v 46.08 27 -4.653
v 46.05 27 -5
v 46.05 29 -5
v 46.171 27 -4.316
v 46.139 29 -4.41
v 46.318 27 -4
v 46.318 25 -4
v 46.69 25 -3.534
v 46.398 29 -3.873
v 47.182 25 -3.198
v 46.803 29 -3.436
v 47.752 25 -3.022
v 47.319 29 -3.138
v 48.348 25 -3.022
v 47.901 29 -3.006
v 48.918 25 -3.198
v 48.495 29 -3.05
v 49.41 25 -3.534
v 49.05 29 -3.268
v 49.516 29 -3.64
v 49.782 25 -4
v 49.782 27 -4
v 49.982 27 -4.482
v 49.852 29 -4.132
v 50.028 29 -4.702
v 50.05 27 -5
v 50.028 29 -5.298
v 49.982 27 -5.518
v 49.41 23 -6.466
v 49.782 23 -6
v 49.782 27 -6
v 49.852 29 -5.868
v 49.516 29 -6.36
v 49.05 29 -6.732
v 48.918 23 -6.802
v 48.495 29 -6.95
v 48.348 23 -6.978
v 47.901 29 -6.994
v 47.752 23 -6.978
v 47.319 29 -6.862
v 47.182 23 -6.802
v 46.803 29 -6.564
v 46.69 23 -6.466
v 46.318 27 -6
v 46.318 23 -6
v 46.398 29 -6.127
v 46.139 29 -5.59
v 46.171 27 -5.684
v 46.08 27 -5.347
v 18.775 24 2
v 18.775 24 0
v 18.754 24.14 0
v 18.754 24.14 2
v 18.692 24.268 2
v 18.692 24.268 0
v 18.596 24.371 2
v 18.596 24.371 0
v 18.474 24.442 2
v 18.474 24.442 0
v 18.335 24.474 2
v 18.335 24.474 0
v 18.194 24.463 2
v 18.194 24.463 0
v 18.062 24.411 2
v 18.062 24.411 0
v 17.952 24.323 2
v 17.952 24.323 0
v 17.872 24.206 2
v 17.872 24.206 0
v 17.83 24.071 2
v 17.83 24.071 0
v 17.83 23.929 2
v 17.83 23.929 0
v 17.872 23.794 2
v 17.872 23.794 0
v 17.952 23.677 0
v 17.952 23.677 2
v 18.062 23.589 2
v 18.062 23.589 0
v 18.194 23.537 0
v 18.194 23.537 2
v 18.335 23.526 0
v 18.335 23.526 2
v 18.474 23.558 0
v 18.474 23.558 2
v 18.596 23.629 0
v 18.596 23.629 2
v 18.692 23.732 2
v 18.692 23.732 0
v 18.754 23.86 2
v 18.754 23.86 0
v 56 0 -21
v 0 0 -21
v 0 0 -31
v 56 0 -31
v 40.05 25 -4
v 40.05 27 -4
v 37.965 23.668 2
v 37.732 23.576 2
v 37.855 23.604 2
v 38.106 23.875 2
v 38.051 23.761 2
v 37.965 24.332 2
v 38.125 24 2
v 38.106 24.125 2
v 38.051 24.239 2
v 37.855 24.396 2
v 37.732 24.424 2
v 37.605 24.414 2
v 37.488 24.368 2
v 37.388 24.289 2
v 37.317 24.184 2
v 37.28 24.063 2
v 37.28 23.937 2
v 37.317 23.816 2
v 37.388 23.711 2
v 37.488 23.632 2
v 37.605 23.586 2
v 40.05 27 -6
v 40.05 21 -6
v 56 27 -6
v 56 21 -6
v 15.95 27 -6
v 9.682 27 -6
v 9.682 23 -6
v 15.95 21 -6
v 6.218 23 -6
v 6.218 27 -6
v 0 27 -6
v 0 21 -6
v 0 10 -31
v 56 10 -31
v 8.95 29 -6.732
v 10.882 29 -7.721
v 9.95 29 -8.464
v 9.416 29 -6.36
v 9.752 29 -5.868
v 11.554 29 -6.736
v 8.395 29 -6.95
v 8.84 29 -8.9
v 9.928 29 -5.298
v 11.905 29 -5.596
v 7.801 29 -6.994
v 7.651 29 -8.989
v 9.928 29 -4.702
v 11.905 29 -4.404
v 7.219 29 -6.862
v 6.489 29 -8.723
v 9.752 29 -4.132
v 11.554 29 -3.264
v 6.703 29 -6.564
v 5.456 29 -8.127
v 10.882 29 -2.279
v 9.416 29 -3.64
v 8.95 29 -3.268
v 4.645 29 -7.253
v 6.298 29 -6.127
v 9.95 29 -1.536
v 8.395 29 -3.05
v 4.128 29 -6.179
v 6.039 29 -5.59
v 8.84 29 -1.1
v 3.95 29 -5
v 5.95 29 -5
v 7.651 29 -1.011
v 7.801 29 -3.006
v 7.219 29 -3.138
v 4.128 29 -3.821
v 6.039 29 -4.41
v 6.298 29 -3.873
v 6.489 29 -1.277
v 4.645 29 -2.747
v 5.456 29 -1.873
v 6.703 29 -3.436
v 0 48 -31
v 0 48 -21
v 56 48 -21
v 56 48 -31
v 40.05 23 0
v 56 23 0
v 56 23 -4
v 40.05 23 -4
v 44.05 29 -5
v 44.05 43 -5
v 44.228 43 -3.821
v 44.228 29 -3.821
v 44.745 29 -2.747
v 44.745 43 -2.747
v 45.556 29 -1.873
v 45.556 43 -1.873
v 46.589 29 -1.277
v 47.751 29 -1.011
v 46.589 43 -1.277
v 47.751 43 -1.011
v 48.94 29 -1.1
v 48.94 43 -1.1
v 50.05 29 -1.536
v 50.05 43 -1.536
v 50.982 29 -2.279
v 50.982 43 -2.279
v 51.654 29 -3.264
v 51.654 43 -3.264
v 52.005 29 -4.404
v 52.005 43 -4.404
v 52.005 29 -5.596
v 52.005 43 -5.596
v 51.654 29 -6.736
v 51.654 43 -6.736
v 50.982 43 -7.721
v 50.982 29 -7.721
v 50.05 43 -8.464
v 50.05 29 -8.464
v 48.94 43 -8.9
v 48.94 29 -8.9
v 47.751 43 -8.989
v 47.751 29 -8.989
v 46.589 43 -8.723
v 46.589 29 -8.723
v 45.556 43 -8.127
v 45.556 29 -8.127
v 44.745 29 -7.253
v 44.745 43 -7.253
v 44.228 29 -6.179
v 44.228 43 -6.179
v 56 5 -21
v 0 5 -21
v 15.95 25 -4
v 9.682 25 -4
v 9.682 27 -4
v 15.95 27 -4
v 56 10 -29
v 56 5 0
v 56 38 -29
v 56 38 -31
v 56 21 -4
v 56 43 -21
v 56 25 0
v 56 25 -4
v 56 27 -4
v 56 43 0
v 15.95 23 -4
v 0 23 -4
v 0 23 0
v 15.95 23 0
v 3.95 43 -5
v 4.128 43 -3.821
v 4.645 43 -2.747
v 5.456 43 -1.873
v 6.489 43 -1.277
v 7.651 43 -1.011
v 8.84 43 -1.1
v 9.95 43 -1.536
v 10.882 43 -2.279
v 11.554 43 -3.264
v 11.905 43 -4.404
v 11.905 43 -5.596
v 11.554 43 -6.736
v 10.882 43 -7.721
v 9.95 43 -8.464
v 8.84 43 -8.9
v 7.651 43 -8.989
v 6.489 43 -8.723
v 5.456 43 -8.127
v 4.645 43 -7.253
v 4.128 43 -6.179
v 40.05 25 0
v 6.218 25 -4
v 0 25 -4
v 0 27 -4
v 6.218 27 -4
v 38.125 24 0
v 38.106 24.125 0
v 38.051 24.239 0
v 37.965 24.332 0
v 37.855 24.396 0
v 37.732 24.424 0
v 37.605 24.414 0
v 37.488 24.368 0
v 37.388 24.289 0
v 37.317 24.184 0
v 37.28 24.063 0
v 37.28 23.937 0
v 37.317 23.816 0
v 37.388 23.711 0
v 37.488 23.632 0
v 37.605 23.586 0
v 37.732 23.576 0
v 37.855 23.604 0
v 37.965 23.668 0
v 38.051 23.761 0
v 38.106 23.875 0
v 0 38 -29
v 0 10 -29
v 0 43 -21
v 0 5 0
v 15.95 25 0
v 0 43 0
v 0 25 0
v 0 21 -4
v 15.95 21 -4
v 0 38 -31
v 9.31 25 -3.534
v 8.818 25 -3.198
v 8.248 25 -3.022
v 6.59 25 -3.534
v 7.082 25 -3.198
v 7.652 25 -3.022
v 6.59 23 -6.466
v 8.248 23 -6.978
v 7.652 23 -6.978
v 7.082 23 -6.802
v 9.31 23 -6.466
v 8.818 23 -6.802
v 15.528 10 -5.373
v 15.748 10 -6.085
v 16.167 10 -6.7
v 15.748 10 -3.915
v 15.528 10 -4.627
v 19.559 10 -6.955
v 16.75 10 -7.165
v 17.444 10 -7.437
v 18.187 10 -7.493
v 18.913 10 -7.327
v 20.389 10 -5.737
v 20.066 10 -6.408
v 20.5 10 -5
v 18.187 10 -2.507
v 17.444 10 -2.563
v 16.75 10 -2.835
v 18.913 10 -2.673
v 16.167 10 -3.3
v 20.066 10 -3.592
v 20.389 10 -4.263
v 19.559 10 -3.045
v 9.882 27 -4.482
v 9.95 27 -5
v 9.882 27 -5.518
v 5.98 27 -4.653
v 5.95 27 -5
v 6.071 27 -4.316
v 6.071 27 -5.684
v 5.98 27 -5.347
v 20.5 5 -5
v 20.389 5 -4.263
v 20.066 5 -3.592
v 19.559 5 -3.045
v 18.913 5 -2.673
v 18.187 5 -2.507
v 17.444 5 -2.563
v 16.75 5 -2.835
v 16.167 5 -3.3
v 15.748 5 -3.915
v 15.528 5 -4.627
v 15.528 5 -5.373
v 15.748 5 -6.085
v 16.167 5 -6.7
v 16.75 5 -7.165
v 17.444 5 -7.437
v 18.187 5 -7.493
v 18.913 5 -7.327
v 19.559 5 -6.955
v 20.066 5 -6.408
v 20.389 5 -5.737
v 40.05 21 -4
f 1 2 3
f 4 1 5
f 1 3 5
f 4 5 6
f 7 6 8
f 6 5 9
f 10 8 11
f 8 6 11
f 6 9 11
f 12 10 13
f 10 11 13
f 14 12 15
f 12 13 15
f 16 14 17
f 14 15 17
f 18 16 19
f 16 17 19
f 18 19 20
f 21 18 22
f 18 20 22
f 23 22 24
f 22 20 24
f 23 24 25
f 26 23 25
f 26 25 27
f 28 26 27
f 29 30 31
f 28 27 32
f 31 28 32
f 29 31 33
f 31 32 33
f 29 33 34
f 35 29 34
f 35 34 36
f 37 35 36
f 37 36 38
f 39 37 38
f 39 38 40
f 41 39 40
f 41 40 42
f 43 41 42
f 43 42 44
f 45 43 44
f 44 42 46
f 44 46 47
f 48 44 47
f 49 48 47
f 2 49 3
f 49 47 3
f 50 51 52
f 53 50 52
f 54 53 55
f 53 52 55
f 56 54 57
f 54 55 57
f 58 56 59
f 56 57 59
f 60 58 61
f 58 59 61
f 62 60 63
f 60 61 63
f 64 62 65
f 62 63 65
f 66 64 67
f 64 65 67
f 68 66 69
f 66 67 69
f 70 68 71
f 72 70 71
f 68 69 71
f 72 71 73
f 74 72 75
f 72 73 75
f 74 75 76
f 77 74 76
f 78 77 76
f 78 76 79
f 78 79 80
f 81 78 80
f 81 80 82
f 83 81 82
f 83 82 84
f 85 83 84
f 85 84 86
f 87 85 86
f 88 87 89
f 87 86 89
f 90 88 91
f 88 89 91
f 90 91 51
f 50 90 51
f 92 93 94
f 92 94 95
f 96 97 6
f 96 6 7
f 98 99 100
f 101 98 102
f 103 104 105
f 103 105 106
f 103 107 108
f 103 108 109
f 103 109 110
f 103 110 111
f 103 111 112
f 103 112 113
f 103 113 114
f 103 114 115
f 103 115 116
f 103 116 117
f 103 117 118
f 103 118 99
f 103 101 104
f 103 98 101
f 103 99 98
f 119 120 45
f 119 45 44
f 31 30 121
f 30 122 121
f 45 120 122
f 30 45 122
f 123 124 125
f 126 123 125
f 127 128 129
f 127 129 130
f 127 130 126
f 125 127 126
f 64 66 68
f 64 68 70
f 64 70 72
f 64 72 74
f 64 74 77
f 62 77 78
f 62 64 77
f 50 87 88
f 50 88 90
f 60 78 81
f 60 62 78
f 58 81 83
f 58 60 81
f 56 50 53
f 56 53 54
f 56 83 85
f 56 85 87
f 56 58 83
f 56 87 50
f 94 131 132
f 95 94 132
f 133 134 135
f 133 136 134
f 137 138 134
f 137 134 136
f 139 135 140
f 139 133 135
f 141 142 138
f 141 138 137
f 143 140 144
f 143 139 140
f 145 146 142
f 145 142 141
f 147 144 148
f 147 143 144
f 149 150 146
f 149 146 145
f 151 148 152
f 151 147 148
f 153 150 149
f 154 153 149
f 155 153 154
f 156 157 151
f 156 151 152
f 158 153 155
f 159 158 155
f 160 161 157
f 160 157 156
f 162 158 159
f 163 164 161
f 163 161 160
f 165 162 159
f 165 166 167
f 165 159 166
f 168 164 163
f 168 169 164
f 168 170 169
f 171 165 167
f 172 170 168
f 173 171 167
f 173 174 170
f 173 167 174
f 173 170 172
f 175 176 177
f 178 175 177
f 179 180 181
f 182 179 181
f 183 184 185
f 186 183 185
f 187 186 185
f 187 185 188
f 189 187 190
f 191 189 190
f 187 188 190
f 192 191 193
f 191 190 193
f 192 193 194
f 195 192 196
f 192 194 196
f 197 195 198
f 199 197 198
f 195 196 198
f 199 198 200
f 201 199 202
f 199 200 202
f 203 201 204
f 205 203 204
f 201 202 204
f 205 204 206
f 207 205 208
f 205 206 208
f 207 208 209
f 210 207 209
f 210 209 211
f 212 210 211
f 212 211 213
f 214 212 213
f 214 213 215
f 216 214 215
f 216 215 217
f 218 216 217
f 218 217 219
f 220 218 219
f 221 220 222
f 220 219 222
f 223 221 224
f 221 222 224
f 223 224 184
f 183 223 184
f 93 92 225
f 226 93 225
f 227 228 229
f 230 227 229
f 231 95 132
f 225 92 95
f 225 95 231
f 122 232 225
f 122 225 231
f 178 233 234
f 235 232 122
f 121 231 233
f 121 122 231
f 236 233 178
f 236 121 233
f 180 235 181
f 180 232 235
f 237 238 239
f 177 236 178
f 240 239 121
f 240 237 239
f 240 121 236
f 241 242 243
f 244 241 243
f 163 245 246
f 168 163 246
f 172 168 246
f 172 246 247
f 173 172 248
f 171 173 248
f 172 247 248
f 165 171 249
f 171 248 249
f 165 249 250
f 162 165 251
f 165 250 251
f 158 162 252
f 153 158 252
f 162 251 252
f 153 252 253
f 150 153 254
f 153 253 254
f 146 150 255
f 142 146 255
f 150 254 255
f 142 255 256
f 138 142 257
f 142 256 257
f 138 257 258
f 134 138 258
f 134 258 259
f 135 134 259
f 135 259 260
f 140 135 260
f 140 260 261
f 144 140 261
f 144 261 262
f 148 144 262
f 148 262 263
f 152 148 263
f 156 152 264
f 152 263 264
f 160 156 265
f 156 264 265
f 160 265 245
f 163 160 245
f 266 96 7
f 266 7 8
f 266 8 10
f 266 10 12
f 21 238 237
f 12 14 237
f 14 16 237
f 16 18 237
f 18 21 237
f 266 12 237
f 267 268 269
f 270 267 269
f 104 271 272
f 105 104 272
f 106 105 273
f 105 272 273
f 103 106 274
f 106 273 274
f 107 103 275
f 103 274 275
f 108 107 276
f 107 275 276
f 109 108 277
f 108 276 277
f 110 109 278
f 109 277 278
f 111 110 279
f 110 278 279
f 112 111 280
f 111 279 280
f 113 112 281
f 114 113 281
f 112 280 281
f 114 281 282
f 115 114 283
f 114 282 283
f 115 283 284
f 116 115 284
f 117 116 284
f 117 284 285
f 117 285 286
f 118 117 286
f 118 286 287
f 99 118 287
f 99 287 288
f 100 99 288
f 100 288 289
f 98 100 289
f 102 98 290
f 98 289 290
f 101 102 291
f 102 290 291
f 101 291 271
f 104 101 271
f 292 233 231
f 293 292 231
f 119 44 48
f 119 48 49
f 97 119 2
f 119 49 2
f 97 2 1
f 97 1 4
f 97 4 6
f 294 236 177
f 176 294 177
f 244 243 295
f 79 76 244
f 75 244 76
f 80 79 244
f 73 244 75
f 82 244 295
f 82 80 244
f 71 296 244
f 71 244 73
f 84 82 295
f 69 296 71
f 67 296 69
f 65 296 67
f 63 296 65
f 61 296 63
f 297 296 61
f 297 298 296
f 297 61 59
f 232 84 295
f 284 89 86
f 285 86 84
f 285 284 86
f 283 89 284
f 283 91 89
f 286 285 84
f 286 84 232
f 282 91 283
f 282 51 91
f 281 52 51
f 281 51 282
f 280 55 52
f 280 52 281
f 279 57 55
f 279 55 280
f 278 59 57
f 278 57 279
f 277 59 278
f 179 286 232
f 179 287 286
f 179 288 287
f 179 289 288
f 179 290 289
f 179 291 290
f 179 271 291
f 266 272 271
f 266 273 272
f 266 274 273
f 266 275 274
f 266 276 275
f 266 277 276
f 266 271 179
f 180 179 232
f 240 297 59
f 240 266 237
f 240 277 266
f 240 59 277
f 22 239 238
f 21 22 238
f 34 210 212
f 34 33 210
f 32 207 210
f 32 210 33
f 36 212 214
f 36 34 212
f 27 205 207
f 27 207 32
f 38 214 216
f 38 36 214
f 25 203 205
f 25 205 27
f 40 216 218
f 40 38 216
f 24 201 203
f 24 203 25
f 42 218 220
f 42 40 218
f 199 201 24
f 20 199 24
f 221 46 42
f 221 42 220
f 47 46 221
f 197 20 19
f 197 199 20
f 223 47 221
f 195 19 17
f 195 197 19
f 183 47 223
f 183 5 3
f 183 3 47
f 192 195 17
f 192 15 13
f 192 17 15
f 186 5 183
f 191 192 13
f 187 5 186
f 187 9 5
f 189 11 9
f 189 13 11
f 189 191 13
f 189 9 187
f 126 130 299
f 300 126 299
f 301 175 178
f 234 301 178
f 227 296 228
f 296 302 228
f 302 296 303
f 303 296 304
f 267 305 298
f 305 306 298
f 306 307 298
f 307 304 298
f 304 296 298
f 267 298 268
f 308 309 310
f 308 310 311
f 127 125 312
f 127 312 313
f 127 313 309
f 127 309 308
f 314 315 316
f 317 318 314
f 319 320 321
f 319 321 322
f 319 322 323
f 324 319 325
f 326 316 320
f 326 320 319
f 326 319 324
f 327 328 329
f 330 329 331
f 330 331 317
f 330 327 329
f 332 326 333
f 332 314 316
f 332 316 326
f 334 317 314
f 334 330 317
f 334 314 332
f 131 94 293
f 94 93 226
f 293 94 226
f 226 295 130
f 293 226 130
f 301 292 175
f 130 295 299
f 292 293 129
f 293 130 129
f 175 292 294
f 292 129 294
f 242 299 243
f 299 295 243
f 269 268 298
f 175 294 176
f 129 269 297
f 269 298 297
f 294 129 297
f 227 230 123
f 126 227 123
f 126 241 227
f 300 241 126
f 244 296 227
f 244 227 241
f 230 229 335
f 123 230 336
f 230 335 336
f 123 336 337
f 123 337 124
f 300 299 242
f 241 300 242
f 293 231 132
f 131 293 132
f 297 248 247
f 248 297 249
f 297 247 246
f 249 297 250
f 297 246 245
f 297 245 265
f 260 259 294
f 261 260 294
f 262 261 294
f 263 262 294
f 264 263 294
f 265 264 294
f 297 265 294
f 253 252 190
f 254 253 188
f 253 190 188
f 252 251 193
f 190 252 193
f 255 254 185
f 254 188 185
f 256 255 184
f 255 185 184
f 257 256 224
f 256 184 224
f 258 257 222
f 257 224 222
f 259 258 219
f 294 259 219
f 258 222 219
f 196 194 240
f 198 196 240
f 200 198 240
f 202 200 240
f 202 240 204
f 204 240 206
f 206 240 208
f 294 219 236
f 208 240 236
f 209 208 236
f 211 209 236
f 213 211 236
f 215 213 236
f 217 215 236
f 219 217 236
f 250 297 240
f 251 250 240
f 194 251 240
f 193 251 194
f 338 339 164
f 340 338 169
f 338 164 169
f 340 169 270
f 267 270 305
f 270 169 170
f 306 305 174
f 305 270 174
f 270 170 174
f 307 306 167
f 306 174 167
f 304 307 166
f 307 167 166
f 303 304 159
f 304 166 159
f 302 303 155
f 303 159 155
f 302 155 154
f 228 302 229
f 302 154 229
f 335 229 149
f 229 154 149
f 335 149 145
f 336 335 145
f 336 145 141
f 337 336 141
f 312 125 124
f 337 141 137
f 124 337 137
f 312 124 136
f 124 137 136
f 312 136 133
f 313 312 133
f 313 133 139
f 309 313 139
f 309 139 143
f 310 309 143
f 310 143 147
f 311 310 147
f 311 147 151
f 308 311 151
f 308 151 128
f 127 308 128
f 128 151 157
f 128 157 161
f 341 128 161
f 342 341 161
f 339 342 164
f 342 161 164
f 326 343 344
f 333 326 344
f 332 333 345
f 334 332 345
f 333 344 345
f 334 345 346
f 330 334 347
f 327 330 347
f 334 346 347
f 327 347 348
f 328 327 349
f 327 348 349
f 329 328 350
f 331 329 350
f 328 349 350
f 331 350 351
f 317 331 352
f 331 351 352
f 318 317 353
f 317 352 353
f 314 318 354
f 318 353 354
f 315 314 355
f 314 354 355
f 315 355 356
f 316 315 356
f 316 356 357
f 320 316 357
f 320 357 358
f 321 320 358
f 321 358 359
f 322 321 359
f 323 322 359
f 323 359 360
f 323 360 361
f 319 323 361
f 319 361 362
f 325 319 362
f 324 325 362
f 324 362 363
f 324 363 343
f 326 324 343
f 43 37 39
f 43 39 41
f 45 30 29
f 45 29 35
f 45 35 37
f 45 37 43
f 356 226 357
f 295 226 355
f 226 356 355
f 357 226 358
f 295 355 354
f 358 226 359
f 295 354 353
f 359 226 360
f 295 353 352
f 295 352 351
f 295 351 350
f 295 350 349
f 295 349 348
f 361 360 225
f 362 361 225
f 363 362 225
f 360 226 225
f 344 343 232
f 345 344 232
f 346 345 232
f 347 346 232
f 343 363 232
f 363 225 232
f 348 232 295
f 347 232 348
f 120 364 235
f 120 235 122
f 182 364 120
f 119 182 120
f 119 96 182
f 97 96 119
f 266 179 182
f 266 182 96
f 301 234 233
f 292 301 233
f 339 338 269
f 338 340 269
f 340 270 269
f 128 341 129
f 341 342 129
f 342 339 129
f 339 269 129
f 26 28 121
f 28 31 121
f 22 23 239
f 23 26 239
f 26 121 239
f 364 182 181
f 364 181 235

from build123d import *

# Parameters (mm, degrees)
F0_W      = 56
F0_H      = 48
F1_DEPTH  = 31
F2_R      = 0.475
F2_R_2    = 0.425
F3_DEPTH  = 2
F6_DEPTH  = 15.95
F7_DEPTH  = 15.95
F8_R      = 2.5
F9_DEPTH  = 10
F11_DEPTH = 56.001
F12_R     = 2
F13_DEPTH = 20
F14_R     = 4
F15_DEPTH = 14


with BuildPart() as f1:
    # F0 (on Top) → F1 (new body)
    with BuildSketch(Plane.XY):
        with Locations((28, 24)):
            Rectangle(F0_W, F0_H)
    extrude(amount=-F1_DEPTH)

    # F2 (on Top) → F3 (join)
    with BuildSketch(Plane.XY):
        with Locations((18.3, 24)):
            Circle(F2_R)
        with Locations((37.7, 24)):
            Circle(F2_R_2)
    extrude(amount=F3_DEPTH)

    # F4 (on face) → F6 (cut)
    with BuildSketch(Plane.YZ.offset(56)):
        Polygon((25, 0), (23, 0), (23, -4), (21, -4), (21, -6), (27, -6), (27, -4), (25, -4), align=None)
    extrude(amount=-F6_DEPTH, mode=Mode.SUBTRACT)

    # F5 (on face) → F7 (cut)
    with BuildSketch(Plane(origin=(0, 0, 0), x_dir=(0, -1, 0), z_dir=(-1, 0, 0))):
        Polygon((-23, 0), (-25, 0), (-25, -4), (-27, -4), (-27, -6), (-21, -6), (-21, -4), (-23, -4), align=None)
    extrude(amount=-F7_DEPTH, mode=Mode.SUBTRACT)

    # F8 (on face) → F9 (cut)
    with BuildSketch(Plane.XZ):
        with Locations((18, -5)):
            Circle(F8_R)
    extrude(amount=-F9_DEPTH, mode=Mode.SUBTRACT)

    # F10 (on face) → F11 (cut, through all)
    with BuildSketch(Plane.YZ.offset(56)):
        Polygon((5, 0), (0, 0), (-4.974183, 0), (-4.974183, -37.207626), (53.682573, -37.207626), (53.682573, 0), (48, 0), (43, 0), (43, -21), (48, -21), (48, -31), (38, -31), (38, -29), (10, -29), (10, -31), (0, -31), (0, -21), (5, -21), align=None)
    extrude(amount=-F11_DEPTH, mode=Mode.SUBTRACT)

    # F12 (on face) → F13 (cut)
    with BuildSketch(Plane(origin=(0, 43, 0), x_dir=(-1, 0, 0), z_dir=(0, 1, 0))):
        with Locations((-48.05, -5)):
            Circle(F12_R)
        with Locations((-7.95, -5)):
            Circle(F12_R)
    extrude(amount=-F13_DEPTH, mode=Mode.SUBTRACT)

    # F14 (on face) → F15 (cut)
    with BuildSketch(Plane(origin=(0, 43, 0), x_dir=(-1, 0, 0), z_dir=(0, 1, 0))):
        with Locations((-48.05, -5)):
            Circle(F14_R)
        with Locations((-7.95, -5)):
            Circle(F14_R)
    extrude(amount=-F15_DEPTH, mode=Mode.SUBTRACT)


solid = f1.part
